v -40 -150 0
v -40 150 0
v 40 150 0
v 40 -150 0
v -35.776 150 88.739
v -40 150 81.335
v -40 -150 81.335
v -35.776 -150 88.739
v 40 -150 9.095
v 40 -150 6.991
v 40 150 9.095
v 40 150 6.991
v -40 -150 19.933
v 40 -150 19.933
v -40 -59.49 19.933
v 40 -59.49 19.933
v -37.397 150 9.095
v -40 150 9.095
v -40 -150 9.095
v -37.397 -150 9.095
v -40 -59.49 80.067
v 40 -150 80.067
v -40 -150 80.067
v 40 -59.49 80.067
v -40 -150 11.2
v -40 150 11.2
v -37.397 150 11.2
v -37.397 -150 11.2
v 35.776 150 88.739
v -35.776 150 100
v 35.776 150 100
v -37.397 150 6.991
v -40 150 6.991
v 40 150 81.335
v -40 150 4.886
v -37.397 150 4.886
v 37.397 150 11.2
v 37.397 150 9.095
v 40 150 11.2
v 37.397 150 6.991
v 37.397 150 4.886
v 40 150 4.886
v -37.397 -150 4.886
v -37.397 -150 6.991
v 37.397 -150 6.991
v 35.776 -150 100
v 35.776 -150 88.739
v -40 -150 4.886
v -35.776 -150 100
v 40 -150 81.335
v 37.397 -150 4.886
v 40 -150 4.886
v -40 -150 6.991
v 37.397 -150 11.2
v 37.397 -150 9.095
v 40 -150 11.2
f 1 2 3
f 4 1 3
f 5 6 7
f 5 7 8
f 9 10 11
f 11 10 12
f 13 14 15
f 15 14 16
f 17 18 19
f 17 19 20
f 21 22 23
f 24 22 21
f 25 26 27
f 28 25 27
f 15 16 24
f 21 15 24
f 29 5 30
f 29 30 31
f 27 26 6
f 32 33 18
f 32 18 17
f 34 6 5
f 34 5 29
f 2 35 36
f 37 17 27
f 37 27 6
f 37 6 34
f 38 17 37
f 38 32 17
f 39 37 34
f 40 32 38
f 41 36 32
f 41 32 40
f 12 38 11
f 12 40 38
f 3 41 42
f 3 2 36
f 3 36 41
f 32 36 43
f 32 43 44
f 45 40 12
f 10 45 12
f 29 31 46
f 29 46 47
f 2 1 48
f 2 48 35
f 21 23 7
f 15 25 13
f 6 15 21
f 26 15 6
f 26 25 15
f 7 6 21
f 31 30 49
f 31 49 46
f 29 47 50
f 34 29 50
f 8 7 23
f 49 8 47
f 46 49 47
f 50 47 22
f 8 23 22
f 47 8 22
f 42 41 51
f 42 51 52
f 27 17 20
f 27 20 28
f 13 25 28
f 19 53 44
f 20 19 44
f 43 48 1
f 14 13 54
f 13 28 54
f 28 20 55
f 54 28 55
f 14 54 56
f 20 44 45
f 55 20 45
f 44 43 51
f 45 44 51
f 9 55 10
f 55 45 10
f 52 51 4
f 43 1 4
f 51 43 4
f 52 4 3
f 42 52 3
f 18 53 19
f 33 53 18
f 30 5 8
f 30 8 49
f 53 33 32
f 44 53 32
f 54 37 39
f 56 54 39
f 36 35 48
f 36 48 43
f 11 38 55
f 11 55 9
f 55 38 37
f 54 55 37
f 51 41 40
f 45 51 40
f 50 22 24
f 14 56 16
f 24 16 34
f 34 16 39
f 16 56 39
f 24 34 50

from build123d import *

# Parameters (mm, degrees)
F0_W     = 80
F0_H     = 300
F1_DEPTH = 100
F3_W     = 90.5103512108
F3_H     = 60.133138299
F4_DEPTH = 128
F2_W     = 2.603494525
F2_H     = 2.1046474576
F5_DEPTH = 322.9


with BuildPart() as f1:
    # F0 (on Top) → F1 (new body)
    with BuildSketch(Plane.XY):
        Rectangle(F0_W, F0_H)
    extrude(amount=F1_DEPTH)

    # F3 (on face) → F4 (cut)
    with BuildSketch(Plane.YZ.offset(40)):
        with Locations((-104.7448243946, 50)):
            Rectangle(F3_W, F3_H)
    extrude(amount=-F4_DEPTH, mode=Mode.SUBTRACT)

    # F2 (on face) → F5 (cut)
    with BuildSketch(Plane.XZ.offset(150)):
        Polygon((40, 100), (35.7759818435, 100), (35.7759818435, 88.739156723), (40, 81.3345983624), align=None)
        Polygon((-35.7759818435, 88.739156723), (-35.7759818435, 100), (-40, 100), (-40, 81.3345983624), align=None)
        with Locations((38.6982527375, 10.1477000862)):
            Rectangle(F2_W, F2_H)
        with Locations((38.6982527375, 5.938405171)):
            Rectangle(F2_W, F2_H)
        with Locations((-38.6982527375, 5.938405171)):
            Rectangle(F2_W, F2_H)
        with Locations((-38.6982527375, 10.1477000862)):
            Rectangle(F2_W, F2_H)
    extrude(amount=-F5_DEPTH, mode=Mode.SUBTRACT)


solid = f1.part
